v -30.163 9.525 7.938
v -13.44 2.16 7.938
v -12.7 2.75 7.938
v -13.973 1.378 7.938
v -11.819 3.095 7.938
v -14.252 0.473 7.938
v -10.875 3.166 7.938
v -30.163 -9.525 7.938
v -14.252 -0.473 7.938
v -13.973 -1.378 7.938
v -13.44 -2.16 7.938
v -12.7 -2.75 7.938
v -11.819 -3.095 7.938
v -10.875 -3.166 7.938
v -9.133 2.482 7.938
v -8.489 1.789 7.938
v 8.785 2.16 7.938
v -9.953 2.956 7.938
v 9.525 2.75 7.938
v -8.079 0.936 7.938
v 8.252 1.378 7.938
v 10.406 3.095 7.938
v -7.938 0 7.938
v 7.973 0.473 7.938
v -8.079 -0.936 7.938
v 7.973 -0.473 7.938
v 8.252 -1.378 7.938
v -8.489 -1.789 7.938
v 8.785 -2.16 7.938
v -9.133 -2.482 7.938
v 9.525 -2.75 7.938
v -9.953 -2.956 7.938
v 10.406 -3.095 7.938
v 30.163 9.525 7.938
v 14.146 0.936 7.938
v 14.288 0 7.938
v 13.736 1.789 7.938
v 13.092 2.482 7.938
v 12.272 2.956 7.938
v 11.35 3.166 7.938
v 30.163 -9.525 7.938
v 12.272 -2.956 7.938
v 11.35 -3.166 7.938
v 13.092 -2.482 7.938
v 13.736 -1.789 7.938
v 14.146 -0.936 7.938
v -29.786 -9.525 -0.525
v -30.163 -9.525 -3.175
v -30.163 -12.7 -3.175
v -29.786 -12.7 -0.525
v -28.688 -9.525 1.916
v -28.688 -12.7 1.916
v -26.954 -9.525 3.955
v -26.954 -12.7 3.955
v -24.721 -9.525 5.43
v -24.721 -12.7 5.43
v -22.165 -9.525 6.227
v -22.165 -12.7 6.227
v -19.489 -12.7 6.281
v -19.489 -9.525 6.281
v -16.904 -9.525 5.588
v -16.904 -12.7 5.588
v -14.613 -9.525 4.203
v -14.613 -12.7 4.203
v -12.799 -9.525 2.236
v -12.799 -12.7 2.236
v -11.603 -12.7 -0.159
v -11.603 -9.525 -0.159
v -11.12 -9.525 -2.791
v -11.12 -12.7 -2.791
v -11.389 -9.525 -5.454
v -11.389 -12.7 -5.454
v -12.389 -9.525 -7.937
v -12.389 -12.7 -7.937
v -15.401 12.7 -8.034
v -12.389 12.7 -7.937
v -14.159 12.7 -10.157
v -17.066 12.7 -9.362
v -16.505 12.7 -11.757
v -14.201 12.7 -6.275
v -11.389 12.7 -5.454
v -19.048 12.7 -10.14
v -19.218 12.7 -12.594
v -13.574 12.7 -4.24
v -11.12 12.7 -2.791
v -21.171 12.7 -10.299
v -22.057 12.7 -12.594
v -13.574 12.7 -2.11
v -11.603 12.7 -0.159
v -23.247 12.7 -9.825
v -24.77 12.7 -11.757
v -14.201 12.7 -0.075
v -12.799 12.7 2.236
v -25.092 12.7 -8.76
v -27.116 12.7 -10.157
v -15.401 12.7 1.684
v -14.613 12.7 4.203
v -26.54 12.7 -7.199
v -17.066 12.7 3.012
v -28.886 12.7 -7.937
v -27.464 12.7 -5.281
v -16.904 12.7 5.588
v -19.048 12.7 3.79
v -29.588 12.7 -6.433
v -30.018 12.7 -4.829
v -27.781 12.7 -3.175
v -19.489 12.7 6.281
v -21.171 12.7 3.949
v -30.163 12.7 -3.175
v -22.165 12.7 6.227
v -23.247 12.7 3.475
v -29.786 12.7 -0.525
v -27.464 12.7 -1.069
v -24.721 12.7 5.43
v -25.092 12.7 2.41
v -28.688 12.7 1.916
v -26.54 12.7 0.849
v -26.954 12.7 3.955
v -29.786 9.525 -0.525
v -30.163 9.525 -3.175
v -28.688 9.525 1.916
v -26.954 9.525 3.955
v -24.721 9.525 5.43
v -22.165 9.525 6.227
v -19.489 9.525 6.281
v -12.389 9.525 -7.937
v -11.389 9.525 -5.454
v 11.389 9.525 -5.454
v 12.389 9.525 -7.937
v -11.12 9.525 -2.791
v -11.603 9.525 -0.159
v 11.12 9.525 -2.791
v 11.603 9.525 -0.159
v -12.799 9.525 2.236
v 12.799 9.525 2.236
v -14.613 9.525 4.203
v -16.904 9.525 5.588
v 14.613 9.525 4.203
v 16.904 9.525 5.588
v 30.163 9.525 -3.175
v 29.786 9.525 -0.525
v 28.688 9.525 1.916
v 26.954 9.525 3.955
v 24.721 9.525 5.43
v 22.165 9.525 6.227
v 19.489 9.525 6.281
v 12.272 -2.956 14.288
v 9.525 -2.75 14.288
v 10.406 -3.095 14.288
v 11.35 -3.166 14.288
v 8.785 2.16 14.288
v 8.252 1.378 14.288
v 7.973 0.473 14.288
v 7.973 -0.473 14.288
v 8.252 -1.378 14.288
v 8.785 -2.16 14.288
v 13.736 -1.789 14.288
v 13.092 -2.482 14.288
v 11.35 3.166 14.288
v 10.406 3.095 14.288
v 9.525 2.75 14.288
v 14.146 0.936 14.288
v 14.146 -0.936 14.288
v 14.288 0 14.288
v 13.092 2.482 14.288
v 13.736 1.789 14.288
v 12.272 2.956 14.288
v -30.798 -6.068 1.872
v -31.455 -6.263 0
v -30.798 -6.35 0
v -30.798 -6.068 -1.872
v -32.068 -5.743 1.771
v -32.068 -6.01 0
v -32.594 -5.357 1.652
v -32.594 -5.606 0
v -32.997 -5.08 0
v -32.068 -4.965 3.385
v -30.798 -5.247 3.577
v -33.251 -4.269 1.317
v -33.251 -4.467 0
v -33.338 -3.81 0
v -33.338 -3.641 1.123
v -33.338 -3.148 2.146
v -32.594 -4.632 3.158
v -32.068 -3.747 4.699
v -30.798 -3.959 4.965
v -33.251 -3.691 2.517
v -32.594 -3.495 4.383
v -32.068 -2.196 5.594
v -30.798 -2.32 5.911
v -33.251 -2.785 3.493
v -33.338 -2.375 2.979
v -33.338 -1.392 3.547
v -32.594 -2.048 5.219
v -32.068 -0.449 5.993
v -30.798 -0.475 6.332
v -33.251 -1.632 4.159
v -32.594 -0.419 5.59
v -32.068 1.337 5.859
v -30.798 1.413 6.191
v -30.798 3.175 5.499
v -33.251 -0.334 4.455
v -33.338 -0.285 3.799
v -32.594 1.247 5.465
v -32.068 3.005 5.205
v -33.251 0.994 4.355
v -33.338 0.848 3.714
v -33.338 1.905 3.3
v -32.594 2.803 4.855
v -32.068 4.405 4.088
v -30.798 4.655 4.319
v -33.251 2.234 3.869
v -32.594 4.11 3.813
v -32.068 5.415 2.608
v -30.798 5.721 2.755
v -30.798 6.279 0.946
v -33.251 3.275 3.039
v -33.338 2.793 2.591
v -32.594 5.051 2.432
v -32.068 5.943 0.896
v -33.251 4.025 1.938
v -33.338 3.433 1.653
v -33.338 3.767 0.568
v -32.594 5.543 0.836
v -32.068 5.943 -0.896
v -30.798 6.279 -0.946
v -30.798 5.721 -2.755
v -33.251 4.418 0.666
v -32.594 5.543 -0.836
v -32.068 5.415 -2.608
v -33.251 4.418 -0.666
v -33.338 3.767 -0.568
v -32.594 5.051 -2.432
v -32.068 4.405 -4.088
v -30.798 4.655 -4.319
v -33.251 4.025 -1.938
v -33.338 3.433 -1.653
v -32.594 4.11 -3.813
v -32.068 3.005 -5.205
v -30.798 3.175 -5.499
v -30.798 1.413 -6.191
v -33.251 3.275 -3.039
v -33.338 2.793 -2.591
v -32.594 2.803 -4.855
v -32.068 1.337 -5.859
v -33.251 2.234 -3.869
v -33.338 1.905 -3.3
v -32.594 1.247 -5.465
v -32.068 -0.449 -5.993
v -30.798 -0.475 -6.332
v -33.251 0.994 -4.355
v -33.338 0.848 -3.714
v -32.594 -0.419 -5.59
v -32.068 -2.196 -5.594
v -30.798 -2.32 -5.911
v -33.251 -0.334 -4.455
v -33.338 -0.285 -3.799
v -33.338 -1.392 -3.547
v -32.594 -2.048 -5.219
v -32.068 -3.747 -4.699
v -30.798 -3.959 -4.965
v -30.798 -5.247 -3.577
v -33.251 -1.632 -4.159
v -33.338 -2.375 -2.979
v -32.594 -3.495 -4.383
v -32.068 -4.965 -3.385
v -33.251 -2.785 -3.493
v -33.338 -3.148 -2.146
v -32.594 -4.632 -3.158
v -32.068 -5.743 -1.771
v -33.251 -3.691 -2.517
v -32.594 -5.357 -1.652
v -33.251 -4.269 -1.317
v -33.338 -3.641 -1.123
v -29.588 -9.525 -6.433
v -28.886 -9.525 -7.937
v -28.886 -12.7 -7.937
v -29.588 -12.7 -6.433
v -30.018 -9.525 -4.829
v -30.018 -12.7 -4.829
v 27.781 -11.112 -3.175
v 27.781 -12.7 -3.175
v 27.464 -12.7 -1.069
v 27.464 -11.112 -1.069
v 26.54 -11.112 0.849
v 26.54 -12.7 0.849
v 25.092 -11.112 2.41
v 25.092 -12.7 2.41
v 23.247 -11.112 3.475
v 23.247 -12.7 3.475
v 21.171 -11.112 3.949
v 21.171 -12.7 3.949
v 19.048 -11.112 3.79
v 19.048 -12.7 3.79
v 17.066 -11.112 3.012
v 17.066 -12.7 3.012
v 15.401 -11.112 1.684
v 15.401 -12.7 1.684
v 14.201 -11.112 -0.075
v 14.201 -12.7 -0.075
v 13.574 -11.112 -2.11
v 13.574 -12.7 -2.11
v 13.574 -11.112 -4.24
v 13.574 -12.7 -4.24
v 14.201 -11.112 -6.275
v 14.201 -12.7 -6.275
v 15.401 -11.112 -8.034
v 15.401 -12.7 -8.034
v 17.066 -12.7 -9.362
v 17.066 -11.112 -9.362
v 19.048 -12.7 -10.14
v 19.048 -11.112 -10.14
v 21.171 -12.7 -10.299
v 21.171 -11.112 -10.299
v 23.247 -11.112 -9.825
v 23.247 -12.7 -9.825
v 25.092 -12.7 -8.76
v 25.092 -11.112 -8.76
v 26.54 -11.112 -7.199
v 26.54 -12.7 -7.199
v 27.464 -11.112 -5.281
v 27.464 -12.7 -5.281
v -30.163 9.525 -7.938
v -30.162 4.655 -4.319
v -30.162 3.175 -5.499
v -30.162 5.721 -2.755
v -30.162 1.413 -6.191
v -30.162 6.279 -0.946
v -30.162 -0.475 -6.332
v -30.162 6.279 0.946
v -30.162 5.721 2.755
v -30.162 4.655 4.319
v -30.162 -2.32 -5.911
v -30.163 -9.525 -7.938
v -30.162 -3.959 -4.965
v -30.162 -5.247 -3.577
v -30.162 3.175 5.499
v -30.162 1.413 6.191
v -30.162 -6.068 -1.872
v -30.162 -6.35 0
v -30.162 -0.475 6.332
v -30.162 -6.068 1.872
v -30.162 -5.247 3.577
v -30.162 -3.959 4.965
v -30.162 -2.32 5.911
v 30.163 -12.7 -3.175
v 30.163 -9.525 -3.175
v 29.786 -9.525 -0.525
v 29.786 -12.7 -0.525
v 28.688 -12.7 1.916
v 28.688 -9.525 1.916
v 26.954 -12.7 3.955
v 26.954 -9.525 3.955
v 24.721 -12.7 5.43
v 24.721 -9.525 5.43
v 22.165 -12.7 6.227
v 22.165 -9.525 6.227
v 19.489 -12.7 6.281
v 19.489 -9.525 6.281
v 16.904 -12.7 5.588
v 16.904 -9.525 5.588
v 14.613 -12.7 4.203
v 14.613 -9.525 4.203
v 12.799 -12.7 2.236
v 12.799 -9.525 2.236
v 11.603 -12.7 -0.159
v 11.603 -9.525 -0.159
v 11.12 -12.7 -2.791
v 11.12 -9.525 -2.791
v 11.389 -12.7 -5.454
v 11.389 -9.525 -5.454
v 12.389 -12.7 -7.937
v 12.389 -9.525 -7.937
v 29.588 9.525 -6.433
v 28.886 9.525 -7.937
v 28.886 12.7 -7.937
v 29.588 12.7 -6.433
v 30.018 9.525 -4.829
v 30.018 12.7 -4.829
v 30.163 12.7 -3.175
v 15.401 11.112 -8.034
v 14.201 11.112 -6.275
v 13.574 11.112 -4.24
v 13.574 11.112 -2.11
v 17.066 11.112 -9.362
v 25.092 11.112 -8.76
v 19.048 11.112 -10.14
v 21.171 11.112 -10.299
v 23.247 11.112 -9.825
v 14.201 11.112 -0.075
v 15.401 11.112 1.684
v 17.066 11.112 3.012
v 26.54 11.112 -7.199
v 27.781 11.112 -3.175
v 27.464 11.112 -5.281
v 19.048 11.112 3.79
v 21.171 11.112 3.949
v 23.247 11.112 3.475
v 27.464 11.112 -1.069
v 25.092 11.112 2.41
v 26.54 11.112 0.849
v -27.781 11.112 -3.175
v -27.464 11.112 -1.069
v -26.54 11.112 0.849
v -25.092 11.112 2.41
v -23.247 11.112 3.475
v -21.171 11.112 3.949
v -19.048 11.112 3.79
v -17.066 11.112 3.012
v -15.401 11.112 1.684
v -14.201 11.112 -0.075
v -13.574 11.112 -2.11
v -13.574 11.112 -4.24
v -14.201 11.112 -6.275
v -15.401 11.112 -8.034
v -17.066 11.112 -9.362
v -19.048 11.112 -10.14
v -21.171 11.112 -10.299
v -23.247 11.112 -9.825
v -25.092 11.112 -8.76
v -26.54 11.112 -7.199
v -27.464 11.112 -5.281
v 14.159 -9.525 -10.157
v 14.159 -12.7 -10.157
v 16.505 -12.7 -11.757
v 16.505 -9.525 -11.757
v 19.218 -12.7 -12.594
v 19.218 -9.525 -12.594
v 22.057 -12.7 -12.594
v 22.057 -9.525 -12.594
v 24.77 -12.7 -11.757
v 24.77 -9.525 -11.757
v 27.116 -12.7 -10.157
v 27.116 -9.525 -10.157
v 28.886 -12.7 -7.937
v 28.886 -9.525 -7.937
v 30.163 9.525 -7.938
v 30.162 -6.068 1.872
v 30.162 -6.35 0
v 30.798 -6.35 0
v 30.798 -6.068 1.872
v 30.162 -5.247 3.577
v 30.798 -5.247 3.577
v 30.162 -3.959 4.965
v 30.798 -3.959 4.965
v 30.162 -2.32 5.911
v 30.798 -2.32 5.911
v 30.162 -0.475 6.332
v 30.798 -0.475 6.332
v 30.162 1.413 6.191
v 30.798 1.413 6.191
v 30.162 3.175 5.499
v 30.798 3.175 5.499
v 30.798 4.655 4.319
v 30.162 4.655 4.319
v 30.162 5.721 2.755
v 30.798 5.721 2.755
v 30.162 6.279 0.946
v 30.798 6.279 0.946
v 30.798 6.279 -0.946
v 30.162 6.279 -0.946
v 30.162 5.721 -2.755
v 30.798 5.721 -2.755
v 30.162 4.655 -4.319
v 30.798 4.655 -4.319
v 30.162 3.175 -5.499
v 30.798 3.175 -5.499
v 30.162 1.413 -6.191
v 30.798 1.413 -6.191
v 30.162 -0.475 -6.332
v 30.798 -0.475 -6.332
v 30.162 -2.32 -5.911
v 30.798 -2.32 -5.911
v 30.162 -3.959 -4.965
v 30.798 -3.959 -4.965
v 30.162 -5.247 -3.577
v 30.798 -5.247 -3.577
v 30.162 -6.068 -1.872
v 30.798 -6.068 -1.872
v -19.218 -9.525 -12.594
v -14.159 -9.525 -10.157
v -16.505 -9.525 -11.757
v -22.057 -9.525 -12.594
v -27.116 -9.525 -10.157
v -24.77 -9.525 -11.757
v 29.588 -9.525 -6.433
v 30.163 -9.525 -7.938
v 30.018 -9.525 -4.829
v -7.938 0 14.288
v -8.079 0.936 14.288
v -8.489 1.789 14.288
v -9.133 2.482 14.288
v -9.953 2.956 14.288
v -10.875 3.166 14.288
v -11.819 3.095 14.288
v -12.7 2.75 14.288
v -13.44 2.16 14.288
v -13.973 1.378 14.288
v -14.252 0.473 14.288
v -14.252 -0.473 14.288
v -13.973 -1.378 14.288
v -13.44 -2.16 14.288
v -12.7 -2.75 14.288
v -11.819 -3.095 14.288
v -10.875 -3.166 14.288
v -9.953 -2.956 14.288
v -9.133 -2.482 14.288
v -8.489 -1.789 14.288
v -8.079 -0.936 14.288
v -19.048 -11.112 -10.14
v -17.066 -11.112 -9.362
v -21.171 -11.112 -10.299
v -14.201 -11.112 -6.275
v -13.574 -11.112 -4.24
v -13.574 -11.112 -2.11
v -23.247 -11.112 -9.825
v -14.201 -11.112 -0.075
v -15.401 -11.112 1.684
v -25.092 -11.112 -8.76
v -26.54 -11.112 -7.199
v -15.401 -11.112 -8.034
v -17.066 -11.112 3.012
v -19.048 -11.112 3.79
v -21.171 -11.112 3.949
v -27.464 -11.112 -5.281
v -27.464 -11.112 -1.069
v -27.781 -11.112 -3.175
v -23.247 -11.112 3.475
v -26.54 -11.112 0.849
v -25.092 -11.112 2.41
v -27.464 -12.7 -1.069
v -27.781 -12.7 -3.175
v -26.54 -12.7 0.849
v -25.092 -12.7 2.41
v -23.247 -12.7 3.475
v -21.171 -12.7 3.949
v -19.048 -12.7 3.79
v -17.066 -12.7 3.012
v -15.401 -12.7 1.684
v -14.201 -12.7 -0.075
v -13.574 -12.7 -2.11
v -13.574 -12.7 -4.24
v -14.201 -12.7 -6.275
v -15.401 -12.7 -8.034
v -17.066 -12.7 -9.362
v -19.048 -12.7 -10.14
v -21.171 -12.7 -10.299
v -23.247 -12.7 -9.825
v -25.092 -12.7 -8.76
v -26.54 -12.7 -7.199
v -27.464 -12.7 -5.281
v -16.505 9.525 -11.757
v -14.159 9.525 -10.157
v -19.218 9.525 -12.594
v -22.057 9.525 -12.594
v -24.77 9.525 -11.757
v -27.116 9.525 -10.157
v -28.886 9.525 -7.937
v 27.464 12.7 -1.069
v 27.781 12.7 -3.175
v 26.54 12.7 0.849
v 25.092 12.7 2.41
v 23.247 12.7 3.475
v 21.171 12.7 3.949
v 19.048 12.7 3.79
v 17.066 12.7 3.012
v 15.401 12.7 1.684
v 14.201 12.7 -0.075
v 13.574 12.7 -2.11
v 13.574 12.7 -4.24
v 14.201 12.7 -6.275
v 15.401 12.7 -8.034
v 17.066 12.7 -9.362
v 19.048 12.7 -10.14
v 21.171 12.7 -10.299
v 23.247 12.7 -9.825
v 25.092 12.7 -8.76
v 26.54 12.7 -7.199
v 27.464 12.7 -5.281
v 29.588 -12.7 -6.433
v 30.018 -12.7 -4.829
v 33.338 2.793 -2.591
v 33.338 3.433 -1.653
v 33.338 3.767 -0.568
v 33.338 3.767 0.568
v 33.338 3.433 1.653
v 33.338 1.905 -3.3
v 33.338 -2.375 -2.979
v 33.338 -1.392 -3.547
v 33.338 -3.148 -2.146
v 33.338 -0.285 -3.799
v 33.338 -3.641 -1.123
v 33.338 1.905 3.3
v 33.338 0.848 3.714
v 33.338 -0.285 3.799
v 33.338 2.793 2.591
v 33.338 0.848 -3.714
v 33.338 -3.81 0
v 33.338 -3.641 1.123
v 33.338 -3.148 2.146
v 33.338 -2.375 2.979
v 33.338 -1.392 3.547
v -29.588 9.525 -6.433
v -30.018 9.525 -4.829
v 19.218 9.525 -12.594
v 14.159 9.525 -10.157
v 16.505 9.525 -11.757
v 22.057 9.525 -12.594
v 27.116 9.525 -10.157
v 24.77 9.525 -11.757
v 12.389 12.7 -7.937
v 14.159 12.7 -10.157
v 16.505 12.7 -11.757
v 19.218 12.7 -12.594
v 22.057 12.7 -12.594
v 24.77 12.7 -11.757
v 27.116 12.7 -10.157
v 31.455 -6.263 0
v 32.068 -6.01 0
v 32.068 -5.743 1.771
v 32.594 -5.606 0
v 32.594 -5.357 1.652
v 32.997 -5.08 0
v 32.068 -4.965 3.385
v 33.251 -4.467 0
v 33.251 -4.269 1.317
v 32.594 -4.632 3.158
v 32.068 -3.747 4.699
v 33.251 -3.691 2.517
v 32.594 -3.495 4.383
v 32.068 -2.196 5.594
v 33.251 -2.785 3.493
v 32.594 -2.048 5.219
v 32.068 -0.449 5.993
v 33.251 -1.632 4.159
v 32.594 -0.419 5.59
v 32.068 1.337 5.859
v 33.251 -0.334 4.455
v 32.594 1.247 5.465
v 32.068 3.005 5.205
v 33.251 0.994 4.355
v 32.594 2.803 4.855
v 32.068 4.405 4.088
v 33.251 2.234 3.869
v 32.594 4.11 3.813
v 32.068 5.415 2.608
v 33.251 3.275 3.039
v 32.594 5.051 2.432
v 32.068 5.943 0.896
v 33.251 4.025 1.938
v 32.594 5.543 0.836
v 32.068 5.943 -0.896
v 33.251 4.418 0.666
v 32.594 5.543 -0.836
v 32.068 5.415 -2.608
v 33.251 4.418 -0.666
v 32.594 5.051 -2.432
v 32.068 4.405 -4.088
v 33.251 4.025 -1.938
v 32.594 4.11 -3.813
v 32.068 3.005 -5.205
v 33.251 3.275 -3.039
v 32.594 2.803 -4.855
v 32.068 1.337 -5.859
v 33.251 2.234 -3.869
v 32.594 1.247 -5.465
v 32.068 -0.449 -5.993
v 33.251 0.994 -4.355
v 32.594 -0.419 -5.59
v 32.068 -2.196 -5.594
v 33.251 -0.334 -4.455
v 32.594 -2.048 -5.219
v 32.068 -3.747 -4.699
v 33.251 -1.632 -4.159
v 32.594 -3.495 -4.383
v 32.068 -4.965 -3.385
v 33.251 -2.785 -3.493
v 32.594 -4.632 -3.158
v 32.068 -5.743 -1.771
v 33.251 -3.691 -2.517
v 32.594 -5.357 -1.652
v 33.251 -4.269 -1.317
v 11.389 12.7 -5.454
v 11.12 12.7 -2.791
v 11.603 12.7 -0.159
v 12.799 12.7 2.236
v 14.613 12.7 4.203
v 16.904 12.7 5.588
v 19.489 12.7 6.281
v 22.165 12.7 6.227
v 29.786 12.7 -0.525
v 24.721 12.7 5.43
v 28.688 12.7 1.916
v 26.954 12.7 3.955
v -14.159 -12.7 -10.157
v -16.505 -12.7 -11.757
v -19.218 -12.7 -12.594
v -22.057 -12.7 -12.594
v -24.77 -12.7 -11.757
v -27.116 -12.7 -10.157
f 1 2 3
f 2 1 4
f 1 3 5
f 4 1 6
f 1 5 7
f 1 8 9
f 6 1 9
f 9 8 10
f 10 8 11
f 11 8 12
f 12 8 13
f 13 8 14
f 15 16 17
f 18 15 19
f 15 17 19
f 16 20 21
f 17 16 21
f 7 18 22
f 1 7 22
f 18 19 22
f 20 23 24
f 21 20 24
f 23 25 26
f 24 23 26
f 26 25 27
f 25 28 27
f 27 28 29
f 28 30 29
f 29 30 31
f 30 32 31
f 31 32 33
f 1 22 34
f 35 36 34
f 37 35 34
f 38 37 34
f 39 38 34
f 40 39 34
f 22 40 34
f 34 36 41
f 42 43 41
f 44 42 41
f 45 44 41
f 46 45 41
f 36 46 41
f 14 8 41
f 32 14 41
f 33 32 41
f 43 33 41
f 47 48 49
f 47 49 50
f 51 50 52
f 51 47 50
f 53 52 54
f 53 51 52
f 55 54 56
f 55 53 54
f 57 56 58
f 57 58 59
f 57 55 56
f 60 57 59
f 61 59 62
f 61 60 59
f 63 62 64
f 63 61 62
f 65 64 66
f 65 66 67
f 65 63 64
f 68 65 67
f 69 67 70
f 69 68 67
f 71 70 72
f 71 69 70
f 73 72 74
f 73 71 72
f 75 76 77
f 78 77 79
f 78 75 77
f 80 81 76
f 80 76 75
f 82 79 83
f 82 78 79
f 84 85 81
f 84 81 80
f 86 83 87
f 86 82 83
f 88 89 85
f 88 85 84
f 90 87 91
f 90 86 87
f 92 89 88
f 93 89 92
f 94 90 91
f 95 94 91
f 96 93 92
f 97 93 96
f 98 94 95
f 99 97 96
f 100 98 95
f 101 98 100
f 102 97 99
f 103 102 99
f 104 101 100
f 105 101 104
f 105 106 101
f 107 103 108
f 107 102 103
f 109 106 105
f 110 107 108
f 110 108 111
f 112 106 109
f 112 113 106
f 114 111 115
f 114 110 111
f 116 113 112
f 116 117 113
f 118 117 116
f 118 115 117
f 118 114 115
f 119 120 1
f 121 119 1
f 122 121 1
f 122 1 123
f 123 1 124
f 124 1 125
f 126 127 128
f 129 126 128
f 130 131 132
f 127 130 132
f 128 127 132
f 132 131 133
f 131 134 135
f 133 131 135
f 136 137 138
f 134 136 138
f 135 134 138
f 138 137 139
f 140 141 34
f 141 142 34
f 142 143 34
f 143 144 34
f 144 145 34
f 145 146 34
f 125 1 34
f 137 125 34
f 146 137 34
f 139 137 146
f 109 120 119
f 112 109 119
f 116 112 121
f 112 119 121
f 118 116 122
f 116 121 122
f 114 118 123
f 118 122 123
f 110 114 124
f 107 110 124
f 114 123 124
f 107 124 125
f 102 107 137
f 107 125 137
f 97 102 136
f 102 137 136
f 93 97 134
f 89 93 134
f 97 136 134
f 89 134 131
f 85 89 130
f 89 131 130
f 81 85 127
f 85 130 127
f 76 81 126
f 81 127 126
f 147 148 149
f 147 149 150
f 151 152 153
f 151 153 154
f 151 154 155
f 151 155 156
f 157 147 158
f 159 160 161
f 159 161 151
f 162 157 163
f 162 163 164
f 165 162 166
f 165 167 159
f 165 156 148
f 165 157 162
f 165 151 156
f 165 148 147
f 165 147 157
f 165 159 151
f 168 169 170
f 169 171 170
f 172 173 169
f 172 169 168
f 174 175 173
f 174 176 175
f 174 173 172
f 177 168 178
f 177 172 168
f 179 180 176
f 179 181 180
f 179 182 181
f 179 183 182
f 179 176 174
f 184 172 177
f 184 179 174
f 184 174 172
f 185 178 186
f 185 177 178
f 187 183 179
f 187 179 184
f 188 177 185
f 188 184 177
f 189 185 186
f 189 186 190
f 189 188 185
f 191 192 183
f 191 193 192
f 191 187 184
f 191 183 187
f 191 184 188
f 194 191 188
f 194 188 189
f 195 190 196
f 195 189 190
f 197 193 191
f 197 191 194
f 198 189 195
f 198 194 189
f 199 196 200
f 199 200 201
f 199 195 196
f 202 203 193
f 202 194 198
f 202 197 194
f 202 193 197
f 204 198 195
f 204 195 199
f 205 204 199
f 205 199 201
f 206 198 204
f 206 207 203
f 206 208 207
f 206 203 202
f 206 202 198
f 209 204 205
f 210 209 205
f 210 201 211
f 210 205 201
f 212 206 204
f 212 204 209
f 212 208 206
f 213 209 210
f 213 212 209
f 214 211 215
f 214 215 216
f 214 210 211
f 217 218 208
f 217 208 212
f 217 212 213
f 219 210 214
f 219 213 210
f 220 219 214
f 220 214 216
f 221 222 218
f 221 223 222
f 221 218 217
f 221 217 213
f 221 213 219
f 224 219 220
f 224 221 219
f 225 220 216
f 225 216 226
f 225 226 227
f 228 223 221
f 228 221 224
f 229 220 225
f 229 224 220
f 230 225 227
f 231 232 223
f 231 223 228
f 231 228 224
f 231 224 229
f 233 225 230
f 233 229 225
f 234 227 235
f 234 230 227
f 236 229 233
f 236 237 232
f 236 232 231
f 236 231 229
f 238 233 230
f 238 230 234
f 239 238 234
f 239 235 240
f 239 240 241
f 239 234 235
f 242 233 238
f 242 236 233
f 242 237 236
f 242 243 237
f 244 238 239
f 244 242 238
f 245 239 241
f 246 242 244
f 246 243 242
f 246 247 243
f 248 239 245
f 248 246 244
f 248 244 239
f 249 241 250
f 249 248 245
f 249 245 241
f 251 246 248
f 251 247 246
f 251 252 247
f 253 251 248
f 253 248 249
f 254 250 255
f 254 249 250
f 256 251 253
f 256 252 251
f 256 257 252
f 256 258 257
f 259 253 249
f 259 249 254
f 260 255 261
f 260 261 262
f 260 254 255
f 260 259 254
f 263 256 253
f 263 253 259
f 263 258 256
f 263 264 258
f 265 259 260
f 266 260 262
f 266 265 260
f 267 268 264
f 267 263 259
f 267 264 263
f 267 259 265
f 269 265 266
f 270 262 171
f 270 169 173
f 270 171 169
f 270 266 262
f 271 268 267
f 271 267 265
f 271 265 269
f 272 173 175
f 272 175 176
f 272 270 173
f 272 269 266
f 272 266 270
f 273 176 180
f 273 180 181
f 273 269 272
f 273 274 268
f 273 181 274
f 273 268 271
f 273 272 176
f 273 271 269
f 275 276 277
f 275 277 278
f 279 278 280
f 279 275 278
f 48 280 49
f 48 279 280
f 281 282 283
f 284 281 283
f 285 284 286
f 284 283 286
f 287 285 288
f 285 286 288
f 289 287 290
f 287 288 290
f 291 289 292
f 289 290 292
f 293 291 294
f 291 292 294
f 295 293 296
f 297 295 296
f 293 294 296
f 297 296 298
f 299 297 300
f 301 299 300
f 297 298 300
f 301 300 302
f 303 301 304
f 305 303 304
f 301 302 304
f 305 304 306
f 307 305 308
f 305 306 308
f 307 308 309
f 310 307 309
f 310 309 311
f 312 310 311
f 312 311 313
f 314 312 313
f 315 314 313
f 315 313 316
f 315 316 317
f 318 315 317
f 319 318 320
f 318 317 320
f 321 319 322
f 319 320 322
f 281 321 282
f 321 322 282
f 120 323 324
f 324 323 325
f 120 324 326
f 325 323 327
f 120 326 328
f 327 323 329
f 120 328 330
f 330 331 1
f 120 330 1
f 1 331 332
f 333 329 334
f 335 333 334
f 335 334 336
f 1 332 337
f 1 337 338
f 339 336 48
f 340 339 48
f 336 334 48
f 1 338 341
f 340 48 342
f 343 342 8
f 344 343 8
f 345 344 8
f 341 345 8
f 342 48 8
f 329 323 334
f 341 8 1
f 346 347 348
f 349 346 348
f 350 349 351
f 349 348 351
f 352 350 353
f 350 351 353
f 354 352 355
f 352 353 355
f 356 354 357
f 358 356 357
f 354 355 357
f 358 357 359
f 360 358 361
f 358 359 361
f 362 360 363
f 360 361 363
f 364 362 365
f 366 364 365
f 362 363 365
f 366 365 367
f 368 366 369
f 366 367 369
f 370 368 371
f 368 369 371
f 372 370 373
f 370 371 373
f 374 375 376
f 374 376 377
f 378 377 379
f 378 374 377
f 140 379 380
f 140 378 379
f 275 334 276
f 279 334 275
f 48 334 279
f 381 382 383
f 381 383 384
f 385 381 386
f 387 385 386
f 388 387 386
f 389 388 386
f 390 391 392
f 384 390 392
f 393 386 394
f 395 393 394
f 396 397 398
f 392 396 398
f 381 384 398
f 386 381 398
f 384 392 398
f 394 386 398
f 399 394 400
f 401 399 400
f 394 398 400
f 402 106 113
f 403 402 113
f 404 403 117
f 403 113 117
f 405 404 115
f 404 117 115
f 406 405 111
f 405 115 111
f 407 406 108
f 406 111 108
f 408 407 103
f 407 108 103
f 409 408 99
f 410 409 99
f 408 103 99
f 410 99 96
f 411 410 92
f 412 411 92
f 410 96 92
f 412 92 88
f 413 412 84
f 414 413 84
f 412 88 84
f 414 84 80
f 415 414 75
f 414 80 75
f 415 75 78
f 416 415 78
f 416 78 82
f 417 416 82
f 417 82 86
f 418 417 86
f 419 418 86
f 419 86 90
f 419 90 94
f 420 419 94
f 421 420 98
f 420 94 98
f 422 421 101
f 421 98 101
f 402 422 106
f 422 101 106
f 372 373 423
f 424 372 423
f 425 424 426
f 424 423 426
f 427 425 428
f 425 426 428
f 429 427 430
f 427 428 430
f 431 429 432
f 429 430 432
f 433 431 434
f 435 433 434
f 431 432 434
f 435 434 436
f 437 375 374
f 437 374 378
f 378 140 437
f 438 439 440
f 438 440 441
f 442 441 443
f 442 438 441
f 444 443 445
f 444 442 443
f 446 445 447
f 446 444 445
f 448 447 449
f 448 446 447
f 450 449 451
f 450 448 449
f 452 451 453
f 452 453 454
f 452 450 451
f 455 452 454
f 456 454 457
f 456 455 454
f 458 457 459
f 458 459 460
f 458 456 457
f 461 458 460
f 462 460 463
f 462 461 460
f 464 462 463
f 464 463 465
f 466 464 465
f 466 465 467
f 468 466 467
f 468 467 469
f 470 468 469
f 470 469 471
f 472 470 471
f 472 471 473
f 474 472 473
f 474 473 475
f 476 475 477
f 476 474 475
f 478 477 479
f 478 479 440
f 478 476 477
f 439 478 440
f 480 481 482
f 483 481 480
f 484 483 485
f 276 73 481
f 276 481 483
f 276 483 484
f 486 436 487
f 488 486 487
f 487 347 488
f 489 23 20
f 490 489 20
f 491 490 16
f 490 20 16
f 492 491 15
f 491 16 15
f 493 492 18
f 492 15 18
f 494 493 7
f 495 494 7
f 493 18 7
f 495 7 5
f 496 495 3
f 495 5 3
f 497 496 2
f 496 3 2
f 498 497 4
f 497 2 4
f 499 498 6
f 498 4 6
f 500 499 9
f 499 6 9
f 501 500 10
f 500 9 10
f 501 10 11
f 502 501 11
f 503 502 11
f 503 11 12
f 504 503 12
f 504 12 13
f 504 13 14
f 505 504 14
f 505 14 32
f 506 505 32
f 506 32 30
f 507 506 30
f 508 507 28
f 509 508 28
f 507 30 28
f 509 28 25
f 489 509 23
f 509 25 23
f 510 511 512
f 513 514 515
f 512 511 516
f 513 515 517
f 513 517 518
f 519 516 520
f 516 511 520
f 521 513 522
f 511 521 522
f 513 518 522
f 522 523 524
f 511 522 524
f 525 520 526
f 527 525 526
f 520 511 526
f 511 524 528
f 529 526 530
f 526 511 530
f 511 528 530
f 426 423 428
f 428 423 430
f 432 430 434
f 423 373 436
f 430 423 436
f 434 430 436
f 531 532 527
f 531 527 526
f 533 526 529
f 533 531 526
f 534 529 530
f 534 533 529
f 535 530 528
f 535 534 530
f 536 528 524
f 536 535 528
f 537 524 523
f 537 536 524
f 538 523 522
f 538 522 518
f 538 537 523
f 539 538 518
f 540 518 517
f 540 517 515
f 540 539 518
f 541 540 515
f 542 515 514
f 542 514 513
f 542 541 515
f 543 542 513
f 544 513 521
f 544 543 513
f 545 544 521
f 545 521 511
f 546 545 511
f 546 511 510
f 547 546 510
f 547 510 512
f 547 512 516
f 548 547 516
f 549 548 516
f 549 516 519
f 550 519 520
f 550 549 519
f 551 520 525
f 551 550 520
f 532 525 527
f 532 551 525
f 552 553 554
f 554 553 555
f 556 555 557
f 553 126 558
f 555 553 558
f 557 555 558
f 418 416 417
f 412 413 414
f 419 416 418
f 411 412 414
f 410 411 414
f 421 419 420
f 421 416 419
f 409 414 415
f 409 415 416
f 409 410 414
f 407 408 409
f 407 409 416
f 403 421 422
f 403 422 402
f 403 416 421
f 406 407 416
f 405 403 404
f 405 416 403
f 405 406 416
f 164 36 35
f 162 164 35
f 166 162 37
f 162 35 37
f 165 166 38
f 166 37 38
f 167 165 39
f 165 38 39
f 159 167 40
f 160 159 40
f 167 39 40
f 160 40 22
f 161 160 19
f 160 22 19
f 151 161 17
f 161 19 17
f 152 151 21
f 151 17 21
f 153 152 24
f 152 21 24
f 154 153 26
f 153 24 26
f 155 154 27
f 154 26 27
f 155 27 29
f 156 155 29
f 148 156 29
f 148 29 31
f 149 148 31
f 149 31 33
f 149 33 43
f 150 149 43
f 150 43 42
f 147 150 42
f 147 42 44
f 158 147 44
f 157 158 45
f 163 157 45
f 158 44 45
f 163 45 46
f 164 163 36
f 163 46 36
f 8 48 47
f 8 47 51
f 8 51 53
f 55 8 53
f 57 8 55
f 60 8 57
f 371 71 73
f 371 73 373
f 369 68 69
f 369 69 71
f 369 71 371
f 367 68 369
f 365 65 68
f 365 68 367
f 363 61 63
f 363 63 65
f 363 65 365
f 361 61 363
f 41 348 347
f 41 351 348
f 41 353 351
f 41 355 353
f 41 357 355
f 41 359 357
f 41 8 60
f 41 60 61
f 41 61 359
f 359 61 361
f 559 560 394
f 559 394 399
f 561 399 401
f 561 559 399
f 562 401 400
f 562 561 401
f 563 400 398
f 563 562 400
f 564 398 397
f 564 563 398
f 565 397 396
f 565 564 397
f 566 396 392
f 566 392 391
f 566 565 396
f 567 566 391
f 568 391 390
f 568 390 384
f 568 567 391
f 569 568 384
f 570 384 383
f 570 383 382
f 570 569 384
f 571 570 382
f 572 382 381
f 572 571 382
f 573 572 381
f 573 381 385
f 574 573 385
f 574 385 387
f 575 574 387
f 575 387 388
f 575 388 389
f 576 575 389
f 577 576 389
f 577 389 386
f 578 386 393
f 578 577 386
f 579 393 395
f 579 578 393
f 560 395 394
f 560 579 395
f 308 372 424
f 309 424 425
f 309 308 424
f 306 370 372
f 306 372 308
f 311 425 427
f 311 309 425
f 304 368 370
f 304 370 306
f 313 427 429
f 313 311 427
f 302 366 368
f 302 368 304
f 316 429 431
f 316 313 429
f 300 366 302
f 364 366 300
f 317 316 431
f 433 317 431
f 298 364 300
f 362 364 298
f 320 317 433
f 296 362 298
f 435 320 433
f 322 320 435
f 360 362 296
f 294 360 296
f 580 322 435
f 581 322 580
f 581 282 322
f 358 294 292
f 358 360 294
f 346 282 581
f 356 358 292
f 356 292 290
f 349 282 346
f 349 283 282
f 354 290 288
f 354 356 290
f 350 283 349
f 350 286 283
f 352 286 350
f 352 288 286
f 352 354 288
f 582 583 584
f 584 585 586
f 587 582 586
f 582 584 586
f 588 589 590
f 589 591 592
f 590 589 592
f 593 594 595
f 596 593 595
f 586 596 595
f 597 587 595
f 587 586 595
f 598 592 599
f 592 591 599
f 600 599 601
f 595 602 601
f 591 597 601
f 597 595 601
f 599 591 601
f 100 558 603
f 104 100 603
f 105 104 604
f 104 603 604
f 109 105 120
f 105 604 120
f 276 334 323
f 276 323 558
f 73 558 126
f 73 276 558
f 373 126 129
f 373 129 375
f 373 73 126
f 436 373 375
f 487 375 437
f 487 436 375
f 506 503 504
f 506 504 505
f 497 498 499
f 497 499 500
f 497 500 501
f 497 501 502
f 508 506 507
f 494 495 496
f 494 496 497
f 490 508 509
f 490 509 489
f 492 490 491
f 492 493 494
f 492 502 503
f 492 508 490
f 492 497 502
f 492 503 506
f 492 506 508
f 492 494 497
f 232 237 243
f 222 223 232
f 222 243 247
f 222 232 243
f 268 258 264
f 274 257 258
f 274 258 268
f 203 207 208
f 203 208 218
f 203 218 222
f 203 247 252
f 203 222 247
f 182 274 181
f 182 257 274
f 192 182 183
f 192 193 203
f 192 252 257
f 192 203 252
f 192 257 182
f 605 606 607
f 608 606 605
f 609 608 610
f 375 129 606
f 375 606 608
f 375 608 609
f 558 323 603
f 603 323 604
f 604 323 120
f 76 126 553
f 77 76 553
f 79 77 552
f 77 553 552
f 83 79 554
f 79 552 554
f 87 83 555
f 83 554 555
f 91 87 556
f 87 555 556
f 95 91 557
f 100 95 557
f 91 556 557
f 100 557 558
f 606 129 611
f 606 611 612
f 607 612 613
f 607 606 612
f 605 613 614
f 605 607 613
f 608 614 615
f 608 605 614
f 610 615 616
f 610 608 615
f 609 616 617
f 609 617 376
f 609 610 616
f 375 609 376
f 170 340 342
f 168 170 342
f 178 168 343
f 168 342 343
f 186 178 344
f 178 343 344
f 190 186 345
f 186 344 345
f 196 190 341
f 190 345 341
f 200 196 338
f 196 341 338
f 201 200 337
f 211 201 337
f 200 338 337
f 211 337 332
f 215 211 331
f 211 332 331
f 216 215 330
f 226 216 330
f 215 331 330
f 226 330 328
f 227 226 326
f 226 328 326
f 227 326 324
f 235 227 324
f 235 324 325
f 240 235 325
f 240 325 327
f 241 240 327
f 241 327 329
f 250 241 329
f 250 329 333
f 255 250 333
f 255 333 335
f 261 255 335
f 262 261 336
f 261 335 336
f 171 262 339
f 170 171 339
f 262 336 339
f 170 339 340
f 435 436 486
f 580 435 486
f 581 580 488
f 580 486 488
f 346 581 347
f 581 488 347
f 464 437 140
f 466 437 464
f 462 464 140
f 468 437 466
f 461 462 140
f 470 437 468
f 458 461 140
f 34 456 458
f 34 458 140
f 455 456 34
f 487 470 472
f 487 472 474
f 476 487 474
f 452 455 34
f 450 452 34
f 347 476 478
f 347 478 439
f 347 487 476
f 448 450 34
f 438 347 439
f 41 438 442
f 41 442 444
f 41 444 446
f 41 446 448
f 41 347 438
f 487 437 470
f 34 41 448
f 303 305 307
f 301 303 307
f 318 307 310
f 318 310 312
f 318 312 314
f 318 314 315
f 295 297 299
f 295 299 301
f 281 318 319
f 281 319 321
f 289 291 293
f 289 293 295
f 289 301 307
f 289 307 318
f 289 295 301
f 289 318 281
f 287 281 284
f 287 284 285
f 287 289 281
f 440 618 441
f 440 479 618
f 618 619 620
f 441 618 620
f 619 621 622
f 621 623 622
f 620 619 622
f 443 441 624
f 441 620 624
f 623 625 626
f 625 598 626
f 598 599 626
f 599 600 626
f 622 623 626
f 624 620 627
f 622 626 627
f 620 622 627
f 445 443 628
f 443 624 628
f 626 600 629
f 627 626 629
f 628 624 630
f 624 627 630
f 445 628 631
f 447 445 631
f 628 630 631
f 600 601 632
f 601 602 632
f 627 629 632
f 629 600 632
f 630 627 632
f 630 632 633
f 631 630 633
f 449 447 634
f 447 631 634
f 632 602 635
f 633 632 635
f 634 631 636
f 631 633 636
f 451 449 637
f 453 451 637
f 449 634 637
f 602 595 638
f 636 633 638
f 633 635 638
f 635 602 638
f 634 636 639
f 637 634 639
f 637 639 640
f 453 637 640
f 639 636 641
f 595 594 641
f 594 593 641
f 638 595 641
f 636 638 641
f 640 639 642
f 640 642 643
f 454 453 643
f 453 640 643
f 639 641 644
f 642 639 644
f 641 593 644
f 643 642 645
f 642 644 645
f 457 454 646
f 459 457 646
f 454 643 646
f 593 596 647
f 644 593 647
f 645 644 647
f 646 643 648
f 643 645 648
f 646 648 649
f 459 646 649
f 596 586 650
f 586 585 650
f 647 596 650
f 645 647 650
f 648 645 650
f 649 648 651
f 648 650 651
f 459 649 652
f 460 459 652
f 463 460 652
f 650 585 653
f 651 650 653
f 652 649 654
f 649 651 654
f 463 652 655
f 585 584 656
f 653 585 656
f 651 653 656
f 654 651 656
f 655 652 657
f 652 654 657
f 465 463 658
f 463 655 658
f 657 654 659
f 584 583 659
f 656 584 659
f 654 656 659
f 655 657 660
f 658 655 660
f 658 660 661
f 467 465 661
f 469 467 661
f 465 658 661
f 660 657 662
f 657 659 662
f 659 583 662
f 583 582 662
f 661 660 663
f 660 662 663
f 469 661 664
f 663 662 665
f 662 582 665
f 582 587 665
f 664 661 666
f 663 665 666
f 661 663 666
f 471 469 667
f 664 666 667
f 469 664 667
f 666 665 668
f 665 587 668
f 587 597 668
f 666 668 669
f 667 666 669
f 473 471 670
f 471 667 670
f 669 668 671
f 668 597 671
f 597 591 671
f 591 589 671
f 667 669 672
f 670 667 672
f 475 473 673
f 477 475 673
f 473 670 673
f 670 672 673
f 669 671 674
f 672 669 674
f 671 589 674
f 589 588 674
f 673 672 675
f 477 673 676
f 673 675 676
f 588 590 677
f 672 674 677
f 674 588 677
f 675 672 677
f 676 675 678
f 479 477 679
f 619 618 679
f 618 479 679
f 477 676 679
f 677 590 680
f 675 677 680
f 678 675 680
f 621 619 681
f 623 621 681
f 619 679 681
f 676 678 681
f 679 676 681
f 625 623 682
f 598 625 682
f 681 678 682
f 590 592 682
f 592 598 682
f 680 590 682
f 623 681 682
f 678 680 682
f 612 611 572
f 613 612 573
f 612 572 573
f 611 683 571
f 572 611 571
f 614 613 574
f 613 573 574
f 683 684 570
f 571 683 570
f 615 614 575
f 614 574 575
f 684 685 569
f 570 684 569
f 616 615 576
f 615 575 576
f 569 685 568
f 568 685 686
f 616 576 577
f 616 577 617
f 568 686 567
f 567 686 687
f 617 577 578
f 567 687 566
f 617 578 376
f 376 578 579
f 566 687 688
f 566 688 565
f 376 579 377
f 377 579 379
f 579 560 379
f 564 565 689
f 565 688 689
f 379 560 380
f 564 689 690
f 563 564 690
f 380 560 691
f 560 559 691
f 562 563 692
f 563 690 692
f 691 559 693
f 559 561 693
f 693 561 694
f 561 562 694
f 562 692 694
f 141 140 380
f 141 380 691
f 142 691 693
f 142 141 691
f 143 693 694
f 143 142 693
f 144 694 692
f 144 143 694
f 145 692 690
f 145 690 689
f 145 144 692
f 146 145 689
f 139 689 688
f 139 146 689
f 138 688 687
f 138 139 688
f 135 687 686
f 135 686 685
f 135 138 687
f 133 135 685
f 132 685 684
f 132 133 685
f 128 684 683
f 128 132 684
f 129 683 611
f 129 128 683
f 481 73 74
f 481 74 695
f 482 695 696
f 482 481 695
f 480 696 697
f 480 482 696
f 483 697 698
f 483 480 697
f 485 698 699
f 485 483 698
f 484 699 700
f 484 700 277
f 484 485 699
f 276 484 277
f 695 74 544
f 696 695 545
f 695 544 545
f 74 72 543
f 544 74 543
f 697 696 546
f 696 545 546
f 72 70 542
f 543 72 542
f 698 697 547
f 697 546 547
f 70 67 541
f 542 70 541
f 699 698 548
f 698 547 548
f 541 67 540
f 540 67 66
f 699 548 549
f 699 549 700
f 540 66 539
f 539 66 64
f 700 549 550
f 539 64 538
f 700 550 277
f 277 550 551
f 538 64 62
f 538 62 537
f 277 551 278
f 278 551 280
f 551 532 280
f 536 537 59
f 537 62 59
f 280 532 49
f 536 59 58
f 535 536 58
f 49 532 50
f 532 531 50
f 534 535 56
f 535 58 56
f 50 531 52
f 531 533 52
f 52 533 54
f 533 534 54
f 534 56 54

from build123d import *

# Parameters (mm, degrees)
F0_W      = 60.325
F0_H      = 15.875
F1_DEPTH  = 9.525
F3_DEPTH  = 3.175
F5_R      = 7.14375
F6_DEPTH  = 1.5875
F9_R      = 6.35
F10_DEPTH = 3.175
F11_R     = 2.54
F13_R     = 3.175
F14_DEPTH = 6.35


# Not quite as in the source:
# - a length typed as a fraction of an inch, garbled in the dataset ("3 / 203.2 mm" for 3/8 in), is restored
# - a feature names something its author has since deleted; it is built from what else it names
# - the program builds the solid bodies; features that only make, move or delete a surface that nothing else refers to are left out


with BuildPart() as f1:
    # F0 (on Front) → F1 (new body, symmetric)
    with BuildSketch(Plane.XZ):
        Rectangle(F0_W, F0_H)
    extrude(amount=F1_DEPTH, both=True)

    # F2 (on face) → F3 (join)
    with BuildSketch(Plane.XZ.offset(9.525)):
        with BuildLine():
            ThreePointArc((28.886391971, -7.9375), (29.8379434954, -5.6402514046), (30.1625, -3.175))
            ThreePointArc((30.1625, -3.175), (18.1722485954, 6.0254434954), (12.388608029, -7.9375))
            Line((12.388608029, -7.9375), (20.6375, -7.9375))
            Line((20.6375, -7.9375), (28.886391971, -7.9375))
        make_face()
        with BuildLine():
            Line((20.6375, -3.175), (20.6375, -7.9375))
            ThreePointArc((20.6375, -7.9375), (15.875, -3.175), (20.6375, 1.5875))
            Line((20.6375, 1.5875), (20.6375, -3.175))
        make_face(mode=Mode.SUBTRACT)
        with BuildLine():
            ThreePointArc((20.6375, 1.5875), (15.875, -3.175), (20.6375, -7.9375))
            Line((20.6375, -7.9375), (20.6375, -3.175))
            Line((20.6375, -3.175), (20.6375, 1.5875))
        make_face()
        with BuildLine():
            Line((20.6375, -7.9375), (12.388608029, -7.9375))
            ThreePointArc((12.388608029, -7.9375), (20.6375, -12.7), (28.886391971, -7.9375))
            Line((28.886391971, -7.9375), (20.6375, -7.9375))
        make_face()
    extrude(amount=F3_DEPTH)

    # F5 (on face) → F6 (cut)
    with BuildSketch(Plane.XZ.offset(12.7)):
        with Locations((20.6375, -3.175)):
            Circle(F5_R)
    extrude(amount=-F6_DEPTH, mode=Mode.SUBTRACT)


with BuildPart() as f7_1:
    # F7: instance of F1
    add(f1.part.mirror(Plane.YZ))


with BuildPart() as f8_1:
    # F8: instance of F1
    add(f1.part.mirror(Plane.XZ))


with BuildPart() as f8_2:
    # F8: instance of F7_1
    add(f7_1.part.mirror(Plane.XZ))


with BuildPart() as f1_1:
    add(f1.part)

    add(f7_1.part)  # F10 merges F7_1

    add(f8_1.part)  # F10 merges F8_1

    add(f8_2.part)  # F10 merges F8_2
    # F9 (on face) → F10 (join)
    with BuildSketch(Plane(origin=(-30.1625, 0, 0), x_dir=(0, -1, 0), z_dir=(-1, 0, 0))):
        Circle(F9_R)
    extrude(amount=F10_DEPTH)

    # F11
    f11_edges = [f1_1.edges().sort_by_distance(p)[0] for p in [
        (-33.3375, 6.35, 0),
    ]]
    fillet(f11_edges, radius=F11_R)


with BuildPart() as f12_1:
    # F12: instance of F1
    add(f1_1.part.mirror(Plane.YZ))


with BuildPart() as f1_2:
    add(f1_1.part)

    add(f12_1.part)  # F14 merges F12_1
    # F13 (on face) → F14 (join)
    with BuildSketch(Plane.XY.offset(7.9375)):
        with Locations((-11.1125, 0)):
            Circle(F13_R)
        with Locations((11.1125, 0)):
            Circle(F13_R)
    extrude(amount=F14_DEPTH)


solid = f1_2.part
